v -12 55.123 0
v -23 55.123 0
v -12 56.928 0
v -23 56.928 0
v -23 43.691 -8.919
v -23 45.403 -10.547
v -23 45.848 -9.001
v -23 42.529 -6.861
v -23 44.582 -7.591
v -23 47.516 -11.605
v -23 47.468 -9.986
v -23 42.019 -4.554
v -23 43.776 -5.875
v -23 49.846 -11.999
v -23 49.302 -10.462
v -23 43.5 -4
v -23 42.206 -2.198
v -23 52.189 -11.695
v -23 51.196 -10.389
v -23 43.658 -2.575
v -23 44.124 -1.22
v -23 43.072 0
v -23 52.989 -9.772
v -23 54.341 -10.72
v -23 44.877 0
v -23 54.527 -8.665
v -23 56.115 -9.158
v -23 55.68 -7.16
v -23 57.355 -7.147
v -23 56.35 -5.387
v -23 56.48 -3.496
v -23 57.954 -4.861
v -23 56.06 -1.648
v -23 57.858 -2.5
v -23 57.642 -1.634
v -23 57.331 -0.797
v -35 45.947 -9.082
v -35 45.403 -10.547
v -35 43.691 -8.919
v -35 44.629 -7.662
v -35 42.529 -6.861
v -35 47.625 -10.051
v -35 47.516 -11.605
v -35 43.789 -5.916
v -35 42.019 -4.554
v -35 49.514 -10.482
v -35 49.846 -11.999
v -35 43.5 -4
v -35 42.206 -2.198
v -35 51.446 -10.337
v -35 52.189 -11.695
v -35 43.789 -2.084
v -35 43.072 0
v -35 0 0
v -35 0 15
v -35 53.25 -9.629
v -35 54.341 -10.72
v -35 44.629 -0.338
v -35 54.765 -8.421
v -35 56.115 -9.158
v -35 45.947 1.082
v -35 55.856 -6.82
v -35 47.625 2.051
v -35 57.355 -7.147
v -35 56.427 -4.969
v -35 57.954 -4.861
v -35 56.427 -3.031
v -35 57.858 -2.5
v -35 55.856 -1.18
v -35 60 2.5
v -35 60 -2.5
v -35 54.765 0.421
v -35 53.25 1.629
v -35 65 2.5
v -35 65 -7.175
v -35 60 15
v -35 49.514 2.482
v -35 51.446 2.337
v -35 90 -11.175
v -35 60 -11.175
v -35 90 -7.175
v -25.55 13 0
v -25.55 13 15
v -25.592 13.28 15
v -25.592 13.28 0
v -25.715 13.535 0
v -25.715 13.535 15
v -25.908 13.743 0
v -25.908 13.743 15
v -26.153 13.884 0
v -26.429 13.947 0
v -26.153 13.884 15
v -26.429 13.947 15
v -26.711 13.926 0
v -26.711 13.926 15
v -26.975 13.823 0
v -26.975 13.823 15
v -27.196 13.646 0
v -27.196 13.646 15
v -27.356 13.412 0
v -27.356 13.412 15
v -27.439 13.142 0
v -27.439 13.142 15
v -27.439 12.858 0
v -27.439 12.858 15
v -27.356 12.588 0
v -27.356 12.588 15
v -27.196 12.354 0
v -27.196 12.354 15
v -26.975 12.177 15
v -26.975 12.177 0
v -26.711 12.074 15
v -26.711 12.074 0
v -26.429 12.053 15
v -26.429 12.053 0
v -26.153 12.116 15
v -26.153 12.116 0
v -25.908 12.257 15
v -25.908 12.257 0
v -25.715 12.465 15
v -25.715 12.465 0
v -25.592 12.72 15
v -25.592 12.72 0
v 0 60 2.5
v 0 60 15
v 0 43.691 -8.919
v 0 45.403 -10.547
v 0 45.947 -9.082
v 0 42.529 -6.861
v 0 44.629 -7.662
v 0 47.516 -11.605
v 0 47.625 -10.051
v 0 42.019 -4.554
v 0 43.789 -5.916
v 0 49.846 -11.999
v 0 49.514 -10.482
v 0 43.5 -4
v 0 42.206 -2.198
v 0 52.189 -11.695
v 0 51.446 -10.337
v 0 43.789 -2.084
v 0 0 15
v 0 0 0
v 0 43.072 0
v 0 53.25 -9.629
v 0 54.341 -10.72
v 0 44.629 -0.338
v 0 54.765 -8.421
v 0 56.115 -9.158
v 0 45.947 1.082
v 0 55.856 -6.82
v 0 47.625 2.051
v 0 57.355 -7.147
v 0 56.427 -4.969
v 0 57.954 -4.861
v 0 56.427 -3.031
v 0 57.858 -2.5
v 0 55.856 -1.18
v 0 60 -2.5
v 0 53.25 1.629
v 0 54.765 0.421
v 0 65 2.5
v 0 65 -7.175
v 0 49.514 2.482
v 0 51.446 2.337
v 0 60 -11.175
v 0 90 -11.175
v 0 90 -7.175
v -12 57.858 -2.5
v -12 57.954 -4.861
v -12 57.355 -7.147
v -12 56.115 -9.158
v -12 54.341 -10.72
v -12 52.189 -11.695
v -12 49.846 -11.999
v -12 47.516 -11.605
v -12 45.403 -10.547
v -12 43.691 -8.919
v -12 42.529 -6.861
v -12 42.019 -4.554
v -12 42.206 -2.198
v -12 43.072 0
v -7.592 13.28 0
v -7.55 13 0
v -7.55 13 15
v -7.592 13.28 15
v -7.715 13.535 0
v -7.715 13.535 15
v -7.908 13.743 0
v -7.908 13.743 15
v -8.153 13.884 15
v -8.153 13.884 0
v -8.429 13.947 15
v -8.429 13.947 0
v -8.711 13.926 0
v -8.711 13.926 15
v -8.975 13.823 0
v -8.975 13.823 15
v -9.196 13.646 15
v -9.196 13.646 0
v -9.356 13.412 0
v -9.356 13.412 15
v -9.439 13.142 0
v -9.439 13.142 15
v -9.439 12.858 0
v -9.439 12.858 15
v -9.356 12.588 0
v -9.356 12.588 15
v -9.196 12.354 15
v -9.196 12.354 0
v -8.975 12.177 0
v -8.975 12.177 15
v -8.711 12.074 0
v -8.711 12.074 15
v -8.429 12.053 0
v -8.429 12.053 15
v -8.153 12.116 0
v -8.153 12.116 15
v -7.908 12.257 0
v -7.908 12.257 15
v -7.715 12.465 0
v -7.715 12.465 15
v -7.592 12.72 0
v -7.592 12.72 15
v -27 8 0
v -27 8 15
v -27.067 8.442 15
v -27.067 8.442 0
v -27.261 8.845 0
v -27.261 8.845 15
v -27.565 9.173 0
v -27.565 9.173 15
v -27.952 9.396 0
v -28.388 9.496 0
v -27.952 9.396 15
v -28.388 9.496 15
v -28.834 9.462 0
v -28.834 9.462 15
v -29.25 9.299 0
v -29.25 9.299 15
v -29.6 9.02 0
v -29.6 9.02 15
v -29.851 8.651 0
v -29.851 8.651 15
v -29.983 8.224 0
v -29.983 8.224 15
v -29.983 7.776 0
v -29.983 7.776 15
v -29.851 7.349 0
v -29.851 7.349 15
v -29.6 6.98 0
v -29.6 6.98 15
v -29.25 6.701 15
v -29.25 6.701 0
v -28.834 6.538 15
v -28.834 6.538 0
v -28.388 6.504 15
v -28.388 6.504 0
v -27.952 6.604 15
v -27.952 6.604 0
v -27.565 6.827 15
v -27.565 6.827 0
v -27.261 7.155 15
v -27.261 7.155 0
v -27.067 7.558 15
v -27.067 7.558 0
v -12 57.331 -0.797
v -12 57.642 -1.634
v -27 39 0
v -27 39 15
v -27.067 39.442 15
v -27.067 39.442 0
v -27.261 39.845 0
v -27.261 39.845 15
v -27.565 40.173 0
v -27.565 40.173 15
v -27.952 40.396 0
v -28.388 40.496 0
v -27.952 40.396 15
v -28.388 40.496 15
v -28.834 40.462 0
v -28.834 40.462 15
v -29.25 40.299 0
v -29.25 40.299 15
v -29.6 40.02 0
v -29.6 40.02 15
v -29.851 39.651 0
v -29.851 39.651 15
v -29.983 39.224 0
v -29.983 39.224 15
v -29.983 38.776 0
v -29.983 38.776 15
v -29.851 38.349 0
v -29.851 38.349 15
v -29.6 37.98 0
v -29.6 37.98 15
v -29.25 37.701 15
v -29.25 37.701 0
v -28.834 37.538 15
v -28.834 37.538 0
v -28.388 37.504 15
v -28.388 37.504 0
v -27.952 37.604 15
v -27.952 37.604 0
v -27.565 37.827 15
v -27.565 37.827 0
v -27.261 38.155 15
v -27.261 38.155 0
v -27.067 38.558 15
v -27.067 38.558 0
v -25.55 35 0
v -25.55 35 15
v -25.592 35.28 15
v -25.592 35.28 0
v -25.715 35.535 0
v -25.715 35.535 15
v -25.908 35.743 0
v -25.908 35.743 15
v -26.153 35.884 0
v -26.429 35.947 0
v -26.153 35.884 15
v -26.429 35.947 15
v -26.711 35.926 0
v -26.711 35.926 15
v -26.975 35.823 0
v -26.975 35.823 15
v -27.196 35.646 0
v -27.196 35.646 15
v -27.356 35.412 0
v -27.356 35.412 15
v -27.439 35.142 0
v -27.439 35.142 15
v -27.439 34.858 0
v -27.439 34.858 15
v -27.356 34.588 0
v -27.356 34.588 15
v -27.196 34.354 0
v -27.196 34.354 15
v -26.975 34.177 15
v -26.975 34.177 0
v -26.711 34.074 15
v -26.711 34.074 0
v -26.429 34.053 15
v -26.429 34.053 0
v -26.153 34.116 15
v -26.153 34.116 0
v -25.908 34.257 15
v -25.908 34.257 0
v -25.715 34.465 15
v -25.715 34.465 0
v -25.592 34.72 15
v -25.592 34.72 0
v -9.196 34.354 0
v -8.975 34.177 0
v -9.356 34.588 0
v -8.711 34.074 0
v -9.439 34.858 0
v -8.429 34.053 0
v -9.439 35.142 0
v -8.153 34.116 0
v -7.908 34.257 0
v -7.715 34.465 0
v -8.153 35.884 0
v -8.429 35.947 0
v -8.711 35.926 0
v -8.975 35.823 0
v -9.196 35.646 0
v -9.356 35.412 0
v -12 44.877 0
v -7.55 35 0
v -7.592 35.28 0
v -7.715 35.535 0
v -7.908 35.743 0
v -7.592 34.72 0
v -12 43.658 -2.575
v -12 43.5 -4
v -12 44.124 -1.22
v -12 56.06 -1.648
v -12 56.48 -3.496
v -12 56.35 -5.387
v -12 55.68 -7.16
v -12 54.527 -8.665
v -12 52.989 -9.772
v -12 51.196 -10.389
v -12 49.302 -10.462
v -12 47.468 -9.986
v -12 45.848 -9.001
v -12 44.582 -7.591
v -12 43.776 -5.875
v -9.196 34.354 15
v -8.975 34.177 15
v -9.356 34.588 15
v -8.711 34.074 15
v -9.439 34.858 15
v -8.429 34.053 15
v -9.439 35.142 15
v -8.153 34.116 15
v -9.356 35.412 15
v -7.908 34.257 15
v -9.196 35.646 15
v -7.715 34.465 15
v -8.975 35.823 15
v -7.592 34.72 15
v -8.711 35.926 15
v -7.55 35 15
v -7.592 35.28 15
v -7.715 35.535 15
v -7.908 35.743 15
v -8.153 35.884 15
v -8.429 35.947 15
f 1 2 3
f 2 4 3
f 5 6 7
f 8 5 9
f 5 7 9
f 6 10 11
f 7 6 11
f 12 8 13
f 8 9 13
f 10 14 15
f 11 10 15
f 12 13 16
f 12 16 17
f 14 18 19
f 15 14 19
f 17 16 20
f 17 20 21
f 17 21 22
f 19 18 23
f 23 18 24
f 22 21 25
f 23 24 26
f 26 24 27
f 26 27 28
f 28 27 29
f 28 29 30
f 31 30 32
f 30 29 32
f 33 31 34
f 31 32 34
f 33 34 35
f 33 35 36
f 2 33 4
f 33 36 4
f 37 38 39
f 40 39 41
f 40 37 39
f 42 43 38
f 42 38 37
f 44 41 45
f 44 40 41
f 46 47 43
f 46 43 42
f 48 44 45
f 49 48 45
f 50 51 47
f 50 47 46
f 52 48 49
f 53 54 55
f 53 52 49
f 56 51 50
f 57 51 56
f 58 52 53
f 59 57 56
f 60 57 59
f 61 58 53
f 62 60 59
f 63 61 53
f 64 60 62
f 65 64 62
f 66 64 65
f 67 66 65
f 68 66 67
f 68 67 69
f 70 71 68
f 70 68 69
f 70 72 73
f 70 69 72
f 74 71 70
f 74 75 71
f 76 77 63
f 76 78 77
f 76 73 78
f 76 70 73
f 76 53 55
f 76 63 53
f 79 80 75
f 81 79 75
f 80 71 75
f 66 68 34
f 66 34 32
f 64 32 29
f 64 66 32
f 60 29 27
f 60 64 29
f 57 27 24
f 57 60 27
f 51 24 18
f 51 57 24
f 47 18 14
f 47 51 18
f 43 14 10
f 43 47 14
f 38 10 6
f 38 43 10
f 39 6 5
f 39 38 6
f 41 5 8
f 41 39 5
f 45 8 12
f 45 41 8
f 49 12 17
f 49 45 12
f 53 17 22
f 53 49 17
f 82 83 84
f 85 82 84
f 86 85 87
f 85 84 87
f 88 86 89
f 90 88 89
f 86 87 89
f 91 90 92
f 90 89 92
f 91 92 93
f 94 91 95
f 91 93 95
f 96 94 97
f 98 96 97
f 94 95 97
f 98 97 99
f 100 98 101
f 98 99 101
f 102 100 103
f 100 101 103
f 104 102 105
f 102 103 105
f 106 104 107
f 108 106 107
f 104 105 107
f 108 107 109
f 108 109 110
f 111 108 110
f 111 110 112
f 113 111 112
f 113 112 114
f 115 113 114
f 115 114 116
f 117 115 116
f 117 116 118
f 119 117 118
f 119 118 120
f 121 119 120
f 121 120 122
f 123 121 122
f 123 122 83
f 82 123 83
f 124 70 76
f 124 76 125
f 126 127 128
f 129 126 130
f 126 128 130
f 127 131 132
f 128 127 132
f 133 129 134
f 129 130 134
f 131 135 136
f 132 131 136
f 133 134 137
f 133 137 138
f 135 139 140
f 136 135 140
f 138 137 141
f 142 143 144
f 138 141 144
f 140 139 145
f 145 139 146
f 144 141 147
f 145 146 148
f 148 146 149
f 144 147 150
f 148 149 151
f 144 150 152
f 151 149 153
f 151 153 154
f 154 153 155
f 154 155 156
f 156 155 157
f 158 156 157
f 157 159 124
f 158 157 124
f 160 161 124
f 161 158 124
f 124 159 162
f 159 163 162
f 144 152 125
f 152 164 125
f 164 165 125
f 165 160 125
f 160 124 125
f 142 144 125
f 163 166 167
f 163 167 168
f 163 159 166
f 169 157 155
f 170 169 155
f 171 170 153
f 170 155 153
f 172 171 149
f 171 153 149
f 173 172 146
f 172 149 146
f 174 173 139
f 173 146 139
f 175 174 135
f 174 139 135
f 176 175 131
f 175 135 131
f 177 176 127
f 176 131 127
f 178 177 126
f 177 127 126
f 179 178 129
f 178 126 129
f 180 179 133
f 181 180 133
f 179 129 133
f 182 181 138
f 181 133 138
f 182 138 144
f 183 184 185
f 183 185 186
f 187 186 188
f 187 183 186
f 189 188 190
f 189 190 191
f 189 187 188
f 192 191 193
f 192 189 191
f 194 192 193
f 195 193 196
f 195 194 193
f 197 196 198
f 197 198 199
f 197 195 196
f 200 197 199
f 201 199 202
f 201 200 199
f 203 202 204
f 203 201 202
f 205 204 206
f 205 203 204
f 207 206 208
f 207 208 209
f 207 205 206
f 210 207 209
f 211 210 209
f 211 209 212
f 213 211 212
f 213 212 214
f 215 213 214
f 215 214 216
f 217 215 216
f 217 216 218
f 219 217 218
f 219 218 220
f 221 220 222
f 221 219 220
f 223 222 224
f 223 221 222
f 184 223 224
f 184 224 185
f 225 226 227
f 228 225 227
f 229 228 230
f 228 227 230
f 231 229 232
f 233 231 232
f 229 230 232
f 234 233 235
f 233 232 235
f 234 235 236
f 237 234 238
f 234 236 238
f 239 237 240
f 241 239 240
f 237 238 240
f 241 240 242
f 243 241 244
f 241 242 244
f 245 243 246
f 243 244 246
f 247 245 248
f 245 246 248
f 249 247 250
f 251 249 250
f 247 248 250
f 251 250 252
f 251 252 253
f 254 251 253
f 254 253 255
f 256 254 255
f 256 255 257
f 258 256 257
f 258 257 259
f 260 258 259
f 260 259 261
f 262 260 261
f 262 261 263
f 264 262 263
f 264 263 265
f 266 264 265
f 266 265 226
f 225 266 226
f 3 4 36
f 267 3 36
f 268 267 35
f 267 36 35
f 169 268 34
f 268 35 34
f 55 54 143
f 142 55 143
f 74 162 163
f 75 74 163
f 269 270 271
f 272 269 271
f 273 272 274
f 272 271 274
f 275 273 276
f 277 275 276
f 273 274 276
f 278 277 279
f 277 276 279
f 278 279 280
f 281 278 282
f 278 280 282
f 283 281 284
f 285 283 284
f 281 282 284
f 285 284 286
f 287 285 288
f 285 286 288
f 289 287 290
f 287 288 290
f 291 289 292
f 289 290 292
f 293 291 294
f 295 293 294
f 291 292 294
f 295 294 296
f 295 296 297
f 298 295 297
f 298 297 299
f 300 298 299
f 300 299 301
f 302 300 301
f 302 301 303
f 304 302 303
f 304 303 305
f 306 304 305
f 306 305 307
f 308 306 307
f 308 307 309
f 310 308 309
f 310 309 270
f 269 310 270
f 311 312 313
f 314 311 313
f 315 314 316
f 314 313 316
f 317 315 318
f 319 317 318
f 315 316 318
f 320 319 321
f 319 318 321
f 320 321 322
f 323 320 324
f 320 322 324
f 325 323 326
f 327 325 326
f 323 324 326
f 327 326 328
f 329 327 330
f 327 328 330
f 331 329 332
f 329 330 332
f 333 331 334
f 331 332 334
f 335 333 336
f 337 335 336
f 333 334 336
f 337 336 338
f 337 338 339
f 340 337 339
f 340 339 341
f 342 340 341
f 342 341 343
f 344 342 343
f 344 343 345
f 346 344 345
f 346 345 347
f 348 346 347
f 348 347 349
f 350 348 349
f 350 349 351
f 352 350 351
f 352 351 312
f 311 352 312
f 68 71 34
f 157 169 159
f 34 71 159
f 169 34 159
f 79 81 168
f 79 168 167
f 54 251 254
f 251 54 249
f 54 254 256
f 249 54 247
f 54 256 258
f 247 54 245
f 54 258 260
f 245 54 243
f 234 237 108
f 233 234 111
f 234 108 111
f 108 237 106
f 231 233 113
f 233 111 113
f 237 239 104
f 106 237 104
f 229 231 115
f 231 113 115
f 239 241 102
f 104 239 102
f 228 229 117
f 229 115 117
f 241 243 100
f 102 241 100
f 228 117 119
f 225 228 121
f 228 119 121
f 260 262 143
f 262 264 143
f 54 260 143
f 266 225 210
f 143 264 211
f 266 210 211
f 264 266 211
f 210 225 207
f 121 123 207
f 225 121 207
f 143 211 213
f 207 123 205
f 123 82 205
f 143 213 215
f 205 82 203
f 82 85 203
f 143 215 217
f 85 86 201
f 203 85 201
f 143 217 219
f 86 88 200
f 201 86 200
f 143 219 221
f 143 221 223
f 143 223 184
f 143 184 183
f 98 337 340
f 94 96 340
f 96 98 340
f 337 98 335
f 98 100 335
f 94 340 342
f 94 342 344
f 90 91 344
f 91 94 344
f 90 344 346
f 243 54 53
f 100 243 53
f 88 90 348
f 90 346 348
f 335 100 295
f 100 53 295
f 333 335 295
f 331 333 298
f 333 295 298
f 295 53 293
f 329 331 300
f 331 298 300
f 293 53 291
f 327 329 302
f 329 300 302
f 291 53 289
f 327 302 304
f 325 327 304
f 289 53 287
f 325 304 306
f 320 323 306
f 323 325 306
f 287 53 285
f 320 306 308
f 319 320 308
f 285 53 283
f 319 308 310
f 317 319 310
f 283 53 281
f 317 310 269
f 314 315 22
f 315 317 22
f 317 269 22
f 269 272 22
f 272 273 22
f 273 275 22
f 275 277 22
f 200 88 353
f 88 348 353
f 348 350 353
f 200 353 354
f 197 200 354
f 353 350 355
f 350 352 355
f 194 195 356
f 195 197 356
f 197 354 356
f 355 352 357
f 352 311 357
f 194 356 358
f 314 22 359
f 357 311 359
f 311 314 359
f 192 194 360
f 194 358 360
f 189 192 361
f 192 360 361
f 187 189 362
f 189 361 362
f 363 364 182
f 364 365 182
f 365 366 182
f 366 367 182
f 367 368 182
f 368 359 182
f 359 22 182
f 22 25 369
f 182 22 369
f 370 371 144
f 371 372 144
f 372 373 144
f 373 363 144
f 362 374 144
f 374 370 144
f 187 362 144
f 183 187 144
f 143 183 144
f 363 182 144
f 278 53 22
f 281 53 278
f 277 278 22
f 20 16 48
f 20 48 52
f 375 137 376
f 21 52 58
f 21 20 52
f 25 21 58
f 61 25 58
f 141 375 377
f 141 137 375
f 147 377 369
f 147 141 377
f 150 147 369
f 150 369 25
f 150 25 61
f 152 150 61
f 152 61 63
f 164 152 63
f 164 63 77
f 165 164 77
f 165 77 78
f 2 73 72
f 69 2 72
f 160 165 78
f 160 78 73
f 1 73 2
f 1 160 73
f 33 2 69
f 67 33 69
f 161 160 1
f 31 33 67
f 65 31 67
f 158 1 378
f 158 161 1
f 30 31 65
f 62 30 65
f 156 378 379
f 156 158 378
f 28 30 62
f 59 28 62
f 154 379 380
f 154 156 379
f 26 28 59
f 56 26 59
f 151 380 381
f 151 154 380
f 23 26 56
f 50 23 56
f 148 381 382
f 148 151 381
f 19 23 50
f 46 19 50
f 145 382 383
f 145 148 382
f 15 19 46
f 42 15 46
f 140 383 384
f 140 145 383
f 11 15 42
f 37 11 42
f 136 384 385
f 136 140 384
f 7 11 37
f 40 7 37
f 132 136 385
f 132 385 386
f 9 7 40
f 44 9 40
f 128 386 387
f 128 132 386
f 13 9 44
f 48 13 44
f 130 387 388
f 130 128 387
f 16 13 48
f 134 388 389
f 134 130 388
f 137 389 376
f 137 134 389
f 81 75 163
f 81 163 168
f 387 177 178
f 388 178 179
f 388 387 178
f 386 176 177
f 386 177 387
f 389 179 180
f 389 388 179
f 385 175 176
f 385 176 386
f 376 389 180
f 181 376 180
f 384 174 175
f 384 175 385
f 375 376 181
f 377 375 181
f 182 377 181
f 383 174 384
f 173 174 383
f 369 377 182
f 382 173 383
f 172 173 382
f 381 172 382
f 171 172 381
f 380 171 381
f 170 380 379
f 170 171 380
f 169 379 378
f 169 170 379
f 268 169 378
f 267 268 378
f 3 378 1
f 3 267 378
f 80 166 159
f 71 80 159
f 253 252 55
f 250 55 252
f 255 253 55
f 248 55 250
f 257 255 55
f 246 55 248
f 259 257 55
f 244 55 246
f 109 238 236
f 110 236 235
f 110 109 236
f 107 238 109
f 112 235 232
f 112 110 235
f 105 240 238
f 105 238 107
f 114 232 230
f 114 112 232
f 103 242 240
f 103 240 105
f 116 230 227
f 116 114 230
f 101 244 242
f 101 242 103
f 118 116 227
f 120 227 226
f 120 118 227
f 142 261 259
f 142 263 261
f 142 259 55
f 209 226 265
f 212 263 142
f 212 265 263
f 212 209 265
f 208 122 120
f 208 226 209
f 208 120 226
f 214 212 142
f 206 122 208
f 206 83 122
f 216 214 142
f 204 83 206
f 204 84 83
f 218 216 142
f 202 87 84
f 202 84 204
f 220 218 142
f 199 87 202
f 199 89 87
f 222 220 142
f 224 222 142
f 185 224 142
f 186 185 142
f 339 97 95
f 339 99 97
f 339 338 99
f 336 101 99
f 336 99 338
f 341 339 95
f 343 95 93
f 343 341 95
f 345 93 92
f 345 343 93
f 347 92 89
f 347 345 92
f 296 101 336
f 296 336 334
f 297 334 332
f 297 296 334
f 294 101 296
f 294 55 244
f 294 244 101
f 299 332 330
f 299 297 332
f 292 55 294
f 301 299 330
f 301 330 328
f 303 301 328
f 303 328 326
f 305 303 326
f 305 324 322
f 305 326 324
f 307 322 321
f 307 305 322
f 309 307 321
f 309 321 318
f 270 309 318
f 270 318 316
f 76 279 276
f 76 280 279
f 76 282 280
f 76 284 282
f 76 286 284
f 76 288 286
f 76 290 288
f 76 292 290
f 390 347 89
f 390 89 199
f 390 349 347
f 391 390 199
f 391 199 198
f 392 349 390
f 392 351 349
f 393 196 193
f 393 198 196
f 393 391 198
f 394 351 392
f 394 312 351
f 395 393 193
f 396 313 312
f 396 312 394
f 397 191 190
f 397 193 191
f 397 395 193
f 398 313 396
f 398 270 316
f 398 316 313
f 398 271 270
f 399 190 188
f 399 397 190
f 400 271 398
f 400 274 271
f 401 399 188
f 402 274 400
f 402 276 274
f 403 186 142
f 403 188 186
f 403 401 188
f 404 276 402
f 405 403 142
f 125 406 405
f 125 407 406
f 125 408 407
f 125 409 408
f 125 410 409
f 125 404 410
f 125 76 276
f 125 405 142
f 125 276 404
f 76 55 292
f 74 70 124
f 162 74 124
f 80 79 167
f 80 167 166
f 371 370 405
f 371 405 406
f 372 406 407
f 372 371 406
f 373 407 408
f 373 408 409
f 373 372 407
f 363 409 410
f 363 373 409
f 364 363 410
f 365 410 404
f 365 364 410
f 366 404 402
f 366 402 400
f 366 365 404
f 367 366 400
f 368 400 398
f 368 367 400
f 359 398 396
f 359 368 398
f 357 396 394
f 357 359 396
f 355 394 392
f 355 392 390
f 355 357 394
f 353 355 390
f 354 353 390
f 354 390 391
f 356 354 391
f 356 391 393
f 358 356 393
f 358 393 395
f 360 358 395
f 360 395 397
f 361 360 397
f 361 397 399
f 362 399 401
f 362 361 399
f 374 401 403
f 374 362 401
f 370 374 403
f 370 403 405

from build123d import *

# Parameters (mm, degrees)
SKETCH1_W                            = 35
SKETCH1_H                            = 60
BOSS_EXTRUDE1_DEPTH                  = 15
SKETCH2_R                            = 1.5
SKETCH2_R_2                          = 0.95
CUT_EXTRUDE1_DEPTH                   = 72.063352018
MIRROR1_OUTLINE_R                    = 0.95
MIRROR1_DEPTH                        = 15
SKETCH3_R                            = 8
BOSS_EXTRUDE2_DEPTH                  = 12
SKETCH4_R                            = 6.5
CUT_EXTRUDE2_DEPTH                   = 72.063352018
SKETCH5_W                            = 35
SKETCH5_H                            = 5
BOSS_EXTRUDE4_DEPTH                  = 5
BOSS_EXTRUDE4_DIRECTION_2_REACH      = 73.063
BOSS_EXTRUDE4_DIRECTION_2_END_RADIUS = 8
BOSS_EXTRUDE7_DEPTH                  = 35


# Read off the part's stored shape, not the designer's step: Mirror1
with BuildPart() as part:
    # Sketch1 → Boss-Extrude1 (new body)
    with BuildSketch(Plane.XY):
        with Locations((-17.5, 30)):
            Rectangle(SKETCH1_W, SKETCH1_H)
    extrude(amount=BOSS_EXTRUDE1_DEPTH)

    # Sketch2 → Cut-Extrude1 (cut, through all)
    with BuildSketch(Plane.XY.offset(15)):
        with Locations((-28.5, 8)):
            Circle(SKETCH2_R)
        with Locations((-26.5, 13)):
            Circle(SKETCH2_R_2)
        with Locations((-26.5, 35)):
            Circle(SKETCH2_R_2)
        with Locations((-28.5, 39)):
            Circle(SKETCH2_R)
    extrude(amount=-CUT_EXTRUDE1_DEPTH, mode=Mode.SUBTRACT)

    # Mirror1 outline → Mirror1 (cut)
    with BuildSketch(Plane.XY):
        with Locations((-8.5, 35)):
            Circle(MIRROR1_OUTLINE_R)
        with Locations((-8.5, 13)):
            Circle(MIRROR1_OUTLINE_R)
    extrude(amount=MIRROR1_DEPTH, mode=Mode.SUBTRACT)

    # Sketch3 → Boss-Extrude2 (add)
    with BuildSketch(Plane.ZY.offset(35)):
        with Locations((-4, 50)):
            Circle(SKETCH3_R)
    boss_extrude2 = extrude(amount=-BOSS_EXTRUDE2_DEPTH)

    # Sketch4 → Cut-Extrude2 (cut, through all)
    with BuildSketch(Plane.ZY.offset(35)):
        with Locations(Location((-4, 50, 0), (0, 0, 270))):
            Circle(SKETCH4_R)
    cut_extrude2 = extrude(amount=-CUT_EXTRUDE2_DEPTH, mode=Mode.SUBTRACT)

    # Mirror2: Boss-Extrude2, Cut-Extrude2 across plane
    add(boss_extrude2.mirror(Plane(origin=(-17.5, 0, 0), x_dir=(0, 0, 1), z_dir=(1, 0, 0))))
    add(cut_extrude2.mirror(Plane(origin=(-17.5, 0, 0), x_dir=(0, 0, 1), z_dir=(1, 0, 0))), mode=Mode.SUBTRACT)

    # Sketch5 → Boss-Extrude4 (add)
    with BuildSketch(Plane(origin=(0, 60, 0), x_dir=(1, 0, 0), z_dir=(0, 1, 0))):
        with Locations((-17.5, 0)):
            Rectangle(SKETCH5_W, SKETCH5_H)
    extrude(amount=BOSS_EXTRUDE4_DEPTH)

    # Boss-Extrude4 direction 2: up to this cylinder (the profile starts outside it)
    boss_extrude4_direction_2_end = Plane(origin=(-17.5, 50, -4), z_dir=(-1, 0, 0)) * Cylinder(BOSS_EXTRUDE4_DIRECTION_2_END_RADIUS, 163.126, mode=Mode.PRIVATE)
    # Sketch5 → Boss-Extrude4 direction 2 (add, up to the surface)
    with BuildSketch(Plane(origin=(0, 60, 0), x_dir=(1, 0, 0), z_dir=(0, 1, 0)), mode=Mode.PRIVATE) as boss_extrude4_direction_2_sk1:
        with Locations((-17.5, 0)):
            Rectangle(SKETCH5_W, SKETCH5_H)
    boss_extrude4_direction_2_tool1 = extrude(boss_extrude4_direction_2_sk1.sketch, amount=-BOSS_EXTRUDE4_DIRECTION_2_REACH, mode=Mode.PRIVATE) - boss_extrude4_direction_2_end
    add(boss_extrude4_direction_2_tool1.solids().sort_by_distance((-17.5, 60, 0))[0])

    # Sketch12 → Boss-Extrude7 (add, through all)
    with BuildSketch(Plane.ZY.offset(35)):
        Polygon((-2.5, 65), (-7.175, 65), (-7.175, 90), (-11.175, 90), (-11.175, 60), (-2.5, 60), align=None)
    extrude(amount=-BOSS_EXTRUDE7_DEPTH)


solid = part.part
